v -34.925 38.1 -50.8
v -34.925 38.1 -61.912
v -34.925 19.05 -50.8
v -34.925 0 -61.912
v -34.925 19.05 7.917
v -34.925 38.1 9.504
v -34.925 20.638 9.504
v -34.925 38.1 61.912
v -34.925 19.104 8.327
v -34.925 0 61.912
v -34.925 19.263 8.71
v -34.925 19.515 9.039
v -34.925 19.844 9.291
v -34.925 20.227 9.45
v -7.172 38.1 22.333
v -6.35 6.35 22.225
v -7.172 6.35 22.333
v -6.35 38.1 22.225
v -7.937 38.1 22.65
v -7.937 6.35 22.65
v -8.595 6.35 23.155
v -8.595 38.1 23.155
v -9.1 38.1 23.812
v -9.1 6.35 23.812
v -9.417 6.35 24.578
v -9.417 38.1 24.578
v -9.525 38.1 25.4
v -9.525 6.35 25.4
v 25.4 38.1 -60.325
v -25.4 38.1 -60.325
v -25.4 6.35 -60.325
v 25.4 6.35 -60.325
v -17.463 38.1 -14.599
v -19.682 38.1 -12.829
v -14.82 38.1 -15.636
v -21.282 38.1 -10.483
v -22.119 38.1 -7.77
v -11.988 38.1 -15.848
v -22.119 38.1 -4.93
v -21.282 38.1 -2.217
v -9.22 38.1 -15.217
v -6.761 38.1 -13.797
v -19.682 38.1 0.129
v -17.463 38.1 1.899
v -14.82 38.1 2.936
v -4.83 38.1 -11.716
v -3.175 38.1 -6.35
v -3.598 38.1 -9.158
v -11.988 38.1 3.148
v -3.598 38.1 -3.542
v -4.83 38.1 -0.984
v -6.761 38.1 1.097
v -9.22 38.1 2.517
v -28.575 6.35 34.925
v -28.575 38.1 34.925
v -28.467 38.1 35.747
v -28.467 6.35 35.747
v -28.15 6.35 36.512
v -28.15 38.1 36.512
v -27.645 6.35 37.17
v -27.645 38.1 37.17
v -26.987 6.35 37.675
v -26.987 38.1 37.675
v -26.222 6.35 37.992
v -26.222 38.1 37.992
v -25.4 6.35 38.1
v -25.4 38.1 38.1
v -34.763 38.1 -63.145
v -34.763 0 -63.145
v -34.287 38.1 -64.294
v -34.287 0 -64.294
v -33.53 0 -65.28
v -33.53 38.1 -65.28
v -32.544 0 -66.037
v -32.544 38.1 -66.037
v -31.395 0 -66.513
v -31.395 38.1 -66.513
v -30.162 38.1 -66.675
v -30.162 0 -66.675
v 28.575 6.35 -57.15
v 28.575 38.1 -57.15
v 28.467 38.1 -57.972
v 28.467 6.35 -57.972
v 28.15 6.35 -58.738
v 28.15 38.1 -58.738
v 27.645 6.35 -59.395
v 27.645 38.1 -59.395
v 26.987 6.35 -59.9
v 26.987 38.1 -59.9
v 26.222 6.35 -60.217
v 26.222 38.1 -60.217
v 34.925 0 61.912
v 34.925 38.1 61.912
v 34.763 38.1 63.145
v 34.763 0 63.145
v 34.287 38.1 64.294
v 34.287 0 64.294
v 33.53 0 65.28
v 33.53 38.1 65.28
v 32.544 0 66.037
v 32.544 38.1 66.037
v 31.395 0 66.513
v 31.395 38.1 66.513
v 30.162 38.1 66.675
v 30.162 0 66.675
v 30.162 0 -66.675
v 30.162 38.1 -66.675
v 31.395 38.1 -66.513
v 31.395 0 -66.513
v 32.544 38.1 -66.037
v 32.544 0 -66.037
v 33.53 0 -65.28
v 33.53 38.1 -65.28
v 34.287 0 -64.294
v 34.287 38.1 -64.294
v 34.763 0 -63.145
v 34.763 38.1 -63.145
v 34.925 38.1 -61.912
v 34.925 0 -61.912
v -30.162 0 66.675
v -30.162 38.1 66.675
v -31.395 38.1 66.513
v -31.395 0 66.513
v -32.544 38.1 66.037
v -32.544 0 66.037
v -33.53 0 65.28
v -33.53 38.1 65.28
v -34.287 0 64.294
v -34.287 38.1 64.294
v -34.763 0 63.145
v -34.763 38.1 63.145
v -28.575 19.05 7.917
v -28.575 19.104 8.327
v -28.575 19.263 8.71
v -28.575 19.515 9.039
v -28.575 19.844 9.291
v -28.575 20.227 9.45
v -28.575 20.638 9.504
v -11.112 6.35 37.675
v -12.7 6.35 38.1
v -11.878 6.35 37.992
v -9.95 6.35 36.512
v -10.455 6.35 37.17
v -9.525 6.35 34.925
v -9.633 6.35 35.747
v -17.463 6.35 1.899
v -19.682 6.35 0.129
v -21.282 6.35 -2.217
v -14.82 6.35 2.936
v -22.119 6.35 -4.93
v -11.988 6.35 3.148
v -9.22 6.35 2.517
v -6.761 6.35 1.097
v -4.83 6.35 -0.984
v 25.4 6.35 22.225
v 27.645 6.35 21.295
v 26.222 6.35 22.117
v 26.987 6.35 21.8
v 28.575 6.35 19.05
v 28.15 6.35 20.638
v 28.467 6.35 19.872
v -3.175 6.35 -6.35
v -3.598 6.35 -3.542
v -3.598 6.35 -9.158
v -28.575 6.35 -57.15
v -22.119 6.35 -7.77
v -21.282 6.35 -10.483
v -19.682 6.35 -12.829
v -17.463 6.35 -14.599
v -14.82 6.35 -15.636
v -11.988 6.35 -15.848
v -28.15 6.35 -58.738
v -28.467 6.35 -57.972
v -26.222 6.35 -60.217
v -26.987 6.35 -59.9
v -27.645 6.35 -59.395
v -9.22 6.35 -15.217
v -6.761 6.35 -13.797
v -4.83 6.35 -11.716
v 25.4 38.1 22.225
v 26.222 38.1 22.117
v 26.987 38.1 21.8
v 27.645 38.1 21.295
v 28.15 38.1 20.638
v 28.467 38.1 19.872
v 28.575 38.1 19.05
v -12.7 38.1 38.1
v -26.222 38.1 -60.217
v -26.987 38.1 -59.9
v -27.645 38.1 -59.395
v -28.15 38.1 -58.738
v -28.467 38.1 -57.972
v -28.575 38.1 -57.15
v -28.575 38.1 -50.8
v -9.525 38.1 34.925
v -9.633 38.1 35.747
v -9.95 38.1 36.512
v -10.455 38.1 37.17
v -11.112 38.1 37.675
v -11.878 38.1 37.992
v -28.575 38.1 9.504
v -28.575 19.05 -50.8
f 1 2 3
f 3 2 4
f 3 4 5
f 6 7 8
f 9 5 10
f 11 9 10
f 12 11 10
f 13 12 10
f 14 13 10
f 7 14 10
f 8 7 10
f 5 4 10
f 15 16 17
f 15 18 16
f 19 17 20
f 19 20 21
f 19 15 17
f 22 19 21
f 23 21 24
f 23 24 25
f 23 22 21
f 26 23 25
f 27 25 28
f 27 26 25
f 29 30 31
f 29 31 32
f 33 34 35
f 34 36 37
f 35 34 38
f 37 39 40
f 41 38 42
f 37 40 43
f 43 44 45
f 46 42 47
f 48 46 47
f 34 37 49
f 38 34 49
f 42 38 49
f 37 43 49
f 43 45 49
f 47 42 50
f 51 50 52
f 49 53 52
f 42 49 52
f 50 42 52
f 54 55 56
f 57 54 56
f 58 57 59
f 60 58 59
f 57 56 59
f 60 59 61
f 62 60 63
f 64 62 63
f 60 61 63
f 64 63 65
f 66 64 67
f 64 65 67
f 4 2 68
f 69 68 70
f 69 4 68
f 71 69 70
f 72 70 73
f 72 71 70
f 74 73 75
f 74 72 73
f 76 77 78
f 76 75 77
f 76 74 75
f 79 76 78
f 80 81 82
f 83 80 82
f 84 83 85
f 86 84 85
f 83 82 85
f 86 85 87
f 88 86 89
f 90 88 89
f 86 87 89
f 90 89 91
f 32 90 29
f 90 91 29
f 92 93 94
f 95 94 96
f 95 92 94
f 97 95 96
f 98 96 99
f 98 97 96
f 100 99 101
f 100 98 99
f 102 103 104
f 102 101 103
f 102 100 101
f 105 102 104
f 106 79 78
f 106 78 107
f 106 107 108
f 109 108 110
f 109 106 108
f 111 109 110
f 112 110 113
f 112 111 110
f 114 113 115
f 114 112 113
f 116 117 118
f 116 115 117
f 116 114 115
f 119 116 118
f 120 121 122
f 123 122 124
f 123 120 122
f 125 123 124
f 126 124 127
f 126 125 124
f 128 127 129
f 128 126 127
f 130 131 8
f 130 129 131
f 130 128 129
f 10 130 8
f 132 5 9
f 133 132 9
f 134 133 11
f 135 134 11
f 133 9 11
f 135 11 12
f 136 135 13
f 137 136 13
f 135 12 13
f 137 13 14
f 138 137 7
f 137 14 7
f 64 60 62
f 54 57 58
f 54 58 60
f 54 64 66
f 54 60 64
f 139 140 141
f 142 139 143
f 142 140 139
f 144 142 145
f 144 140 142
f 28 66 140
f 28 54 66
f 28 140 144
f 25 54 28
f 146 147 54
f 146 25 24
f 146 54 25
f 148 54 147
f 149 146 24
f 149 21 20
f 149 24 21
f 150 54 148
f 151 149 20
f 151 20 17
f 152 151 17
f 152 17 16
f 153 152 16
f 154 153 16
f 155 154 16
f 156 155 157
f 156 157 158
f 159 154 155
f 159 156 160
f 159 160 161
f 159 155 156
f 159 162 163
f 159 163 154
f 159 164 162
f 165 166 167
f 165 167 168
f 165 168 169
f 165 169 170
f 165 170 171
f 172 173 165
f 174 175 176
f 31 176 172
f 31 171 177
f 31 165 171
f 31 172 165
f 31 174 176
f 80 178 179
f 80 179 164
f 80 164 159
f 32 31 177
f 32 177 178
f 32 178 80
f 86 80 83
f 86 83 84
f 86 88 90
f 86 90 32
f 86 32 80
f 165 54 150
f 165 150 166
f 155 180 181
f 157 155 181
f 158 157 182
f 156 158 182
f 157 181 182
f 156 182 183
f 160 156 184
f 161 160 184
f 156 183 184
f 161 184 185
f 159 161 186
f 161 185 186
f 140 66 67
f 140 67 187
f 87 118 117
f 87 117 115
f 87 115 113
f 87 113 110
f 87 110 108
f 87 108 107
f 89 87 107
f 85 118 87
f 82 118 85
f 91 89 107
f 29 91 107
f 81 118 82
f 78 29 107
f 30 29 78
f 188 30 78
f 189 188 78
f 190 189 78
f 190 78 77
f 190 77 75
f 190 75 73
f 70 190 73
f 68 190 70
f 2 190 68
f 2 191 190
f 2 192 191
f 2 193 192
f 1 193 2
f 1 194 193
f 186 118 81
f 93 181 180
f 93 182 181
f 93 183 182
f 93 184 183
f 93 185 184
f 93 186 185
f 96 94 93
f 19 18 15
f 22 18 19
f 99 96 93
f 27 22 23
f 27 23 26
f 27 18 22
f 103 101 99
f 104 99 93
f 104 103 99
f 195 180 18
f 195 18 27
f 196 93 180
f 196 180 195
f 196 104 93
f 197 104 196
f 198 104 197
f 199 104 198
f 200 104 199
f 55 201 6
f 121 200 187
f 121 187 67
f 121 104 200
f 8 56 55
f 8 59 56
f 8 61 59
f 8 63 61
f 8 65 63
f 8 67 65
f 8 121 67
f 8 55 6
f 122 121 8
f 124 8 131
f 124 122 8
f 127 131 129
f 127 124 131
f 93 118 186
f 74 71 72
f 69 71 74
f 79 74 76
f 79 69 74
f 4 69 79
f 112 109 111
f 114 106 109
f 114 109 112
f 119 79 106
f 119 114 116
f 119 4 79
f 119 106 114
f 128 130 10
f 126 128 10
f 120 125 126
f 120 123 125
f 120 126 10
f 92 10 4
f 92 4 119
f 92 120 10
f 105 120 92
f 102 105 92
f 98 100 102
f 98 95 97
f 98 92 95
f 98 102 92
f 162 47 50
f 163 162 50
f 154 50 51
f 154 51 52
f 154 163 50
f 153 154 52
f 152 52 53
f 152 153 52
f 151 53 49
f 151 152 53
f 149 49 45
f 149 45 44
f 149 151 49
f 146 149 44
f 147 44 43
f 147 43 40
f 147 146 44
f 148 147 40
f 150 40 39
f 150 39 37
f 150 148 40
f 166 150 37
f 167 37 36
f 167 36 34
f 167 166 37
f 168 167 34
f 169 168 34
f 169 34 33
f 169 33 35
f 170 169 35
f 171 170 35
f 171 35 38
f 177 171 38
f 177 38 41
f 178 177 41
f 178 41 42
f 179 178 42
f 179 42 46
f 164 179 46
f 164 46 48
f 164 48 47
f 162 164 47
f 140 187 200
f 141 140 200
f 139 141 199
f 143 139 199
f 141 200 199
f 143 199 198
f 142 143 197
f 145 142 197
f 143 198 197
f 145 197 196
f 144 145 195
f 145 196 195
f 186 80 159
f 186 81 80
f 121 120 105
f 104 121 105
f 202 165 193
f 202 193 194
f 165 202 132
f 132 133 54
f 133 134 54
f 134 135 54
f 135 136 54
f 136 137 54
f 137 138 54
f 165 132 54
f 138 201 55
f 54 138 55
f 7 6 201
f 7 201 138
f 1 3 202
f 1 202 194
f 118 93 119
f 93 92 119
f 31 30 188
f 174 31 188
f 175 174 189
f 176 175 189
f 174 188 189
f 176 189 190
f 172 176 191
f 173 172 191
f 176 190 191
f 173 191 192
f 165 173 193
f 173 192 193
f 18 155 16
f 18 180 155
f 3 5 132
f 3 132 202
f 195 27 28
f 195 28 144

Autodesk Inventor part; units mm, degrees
ref_plane "YZ Plane" through (0, 0, 0) normal (1, 0, 0) x (0, 1, 0)
ref_plane "XZ Plane" through (0, 0, 0) normal (0, 1, 0) x (-1, 0, 0)
ref_plane "XY Plane" through (0, 0, 0) normal (0, 0, 1) x (1, 0, 0)
sketch "Boceto1" plane through (0, 0, 0) normal (0, 1, 0) x (-1, 0, 0)
  line L0 (30.1625, 61.9125) -> (-30.1625, 61.9125) construction
  line L1 (-30.1625, 61.9125) -> (-30.1625, -61.9125) construction
  line L2 (-30.1625, -61.9125) -> (30.1625, -61.9125) construction
  line L3 (30.1625, -61.9125) -> (30.1625, 61.9125) construction
  line L4 (30.1625, 61.9125) -> (-30.1625, -61.9125) construction
  line L5 (-30.1625, 61.9125) -> (30.1625, -61.9125) construction
  arc A0 (-34.925, -61.9125) -> (-30.1625, -66.675) centre (-30.1625, -61.9125) ccw
  arc A1 (-30.1625, 66.675) -> (-34.925, 61.9125) centre (-30.1625, 61.9125) ccw
  arc A2 (34.925, 61.9125) -> (30.1625, 66.675) centre (30.1625, 61.9125) ccw
  line L6 (34.925, -61.9125) -> (34.925, 61.9125)
  line L7 (30.1625, 66.675) -> (-30.1625, 66.675)
  line L8 (-34.925, 61.9125) -> (-34.925, -61.9125)
  line L9 (30.1625, -66.675) -> (-30.1625, -66.675)
  arc A3 (30.1625, -66.675) -> (34.925, -61.9125) centre (30.1625, -61.9125) ccw
  arc A4 (30.1625, -57.15) -> (28.0767, -57.6311) centre (30.1625, -61.9125) ccw
  point P0 (0, 0)
  dimension "d0" = 60.325
  dimension "d1" = 123.825
  dimension "d3" = 9.525
  dimension "d4" = 9.525
  dimension "d5" = 9.525
  dimension "d6" = 69.85
  dimension "d7" = 133.35
extrude "Extrusión1" add sketch "Boceto1" along normal blind 38.1
sketch "Boceto3" plane through (0, 38.1, 0) normal (0, 1, 0) x (1, 0, 0)
  line L0 (-25.4, 60.325) -> (25.4, 60.325)
  line L1 (28.575, 57.15) -> (28.575, -19.05)
  line L2 (25.4, -22.225) -> (-6.35, -22.225)
  line L3 (-9.525, -25.4) -> (-9.525, -34.925)
  line L4 (-28.575, 57.15) -> (-28.575, -34.925)
  line L5 (-25.4, -38.1) -> (-12.7, -38.1)
  line L6 (30.1625, 66.675) -> (-30.1625, 66.675) projected
  line L7 (-34.925, 61.9125) -> (-34.925, -61.9125) projected
  line L8 (34.925, -61.9125) -> (34.925, 61.9125) projected
  line L9 (-30.1625, -66.675) -> (30.1625, -66.675) projected
  arc A0 (-25.4, 60.325) -> (-28.575, 57.15) centre (-25.4, 57.15) ccw
  arc A1 (28.575, 57.15) -> (25.4, 60.325) centre (25.4, 57.15) ccw
  arc A2 (25.4, -22.225) -> (28.575, -19.05) centre (25.4, -19.05) ccw
  arc A3 (-6.35, -22.225) -> (-9.525, -25.4) centre (-6.35, -25.4) ccw
  arc A4 (-12.7, -38.1) -> (-9.525, -34.925) centre (-12.7, -34.925) ccw
  arc A5 (-28.575, -34.925) -> (-25.4, -38.1) centre (-25.4, -34.925) ccw
  point P0 (0, 0)
  dimension "d20" = 6.35
  dimension "d21" = 6.35
  dimension "d22" = 6.35
  dimension "d23" = 44.45
  dimension "d24" = 15.875
  dimension "d25" = 38.1
  dimension "d26" = 3.175
extrude "Extrusión2" cut sketch "Boceto3" against normal blind 31.75
sketch "Boceto4" plane through (-34.925, 0, -61.9125) normal (-1, 0, 0) x (0, 0, 1)
  line L0 (11.1125, 38.1) -> (71.4166, 38.1)
  line L1 (71.4166, 38.1) -> (71.4166, 20.6375)
  line L2 (69.8291, 19.05) -> (11.1125, 19.05)
  line L3 (11.1125, 19.05) -> (11.1125, 38.1)
  line L4 (-4.7625, 0) -> (-4.7625, 38.1) projected
  line L5 (0, 38.1) -> (123.825, 38.1) projected
  arc A0 (69.8291, 19.05) -> (71.4166, 20.6375) centre (69.8291, 20.6375) ccw
  point P0 (61.9125, 0)
  dimension "d29" = 15.875
  dimension "d30" = 19.05
  dimension "d31" = 60.325
  dimension "d32" = 3.175
extrude "Extrusión3" cut sketch "Boceto4" against normal blind 6.35
sketch "Boceto6" plane through (0, 0, 0) normal (0, -1, 0) x (1, 0, 0)
  circle A0 centre (-12.7, -6.35) radius 9.525
  line L0 (30.1625, -66.675) -> (-30.1625, -66.675) projected
  line L1 (-34.925, -61.9125) -> (-34.925, 61.9125) projected
  point P0 (0, 0)
  dimension "d44" = 19.05
  dimension "d45" = 60.325
  dimension "d46" = 22.225
extrude "Extrusión5" add sketch "Boceto6" against normal blind 38.1
sketch "Boceto7" plane through (0, 0, 0) normal (0, -1, 0) x (1, 0, 0)
  circle A0 centre (-12.7, -6.35) radius 9.525 construction
  line L0 (28.575, -57.15) -> (28.575, 19.05) construction
  arc A1 (28.575, 19.05) -> (25.4, 22.225) centre (25.4, 19.05) ccw construction
  line L1 (25.4, 22.225) -> (-6.35, 22.225) construction
  line L2 (-9.525, 25.4) -> (-9.525, 34.925) construction
  arc A2 (-9.525, 25.4) -> (-6.35, 22.225) centre (-6.35, 25.4) ccw construction
  arc A3 (-9.525, 34.925) -> (-12.7, 38.1) centre (-12.7, 34.925) ccw construction
  line L3 (-12.7, 38.1) -> (-25.4, 38.1) construction
  arc A4 (-25.4, 38.1) -> (-28.575, 34.925) centre (-25.4, 34.925) ccw construction
  line L4 (-28.575, 34.925) -> (-28.575, -57.15) construction
  line L5 (-25.4, -60.325) -> (25.4, -60.325) construction
  arc A5 (25.4, -60.325) -> (28.575, -57.15) centre (25.4, -57.15) ccw construction
  arc A6 (-28.575, -57.15) -> (-25.4, -60.325) centre (-25.4, -57.15) ccw construction
  point P0 (0, 0)
properties part number "Lab8A01209499P1"
